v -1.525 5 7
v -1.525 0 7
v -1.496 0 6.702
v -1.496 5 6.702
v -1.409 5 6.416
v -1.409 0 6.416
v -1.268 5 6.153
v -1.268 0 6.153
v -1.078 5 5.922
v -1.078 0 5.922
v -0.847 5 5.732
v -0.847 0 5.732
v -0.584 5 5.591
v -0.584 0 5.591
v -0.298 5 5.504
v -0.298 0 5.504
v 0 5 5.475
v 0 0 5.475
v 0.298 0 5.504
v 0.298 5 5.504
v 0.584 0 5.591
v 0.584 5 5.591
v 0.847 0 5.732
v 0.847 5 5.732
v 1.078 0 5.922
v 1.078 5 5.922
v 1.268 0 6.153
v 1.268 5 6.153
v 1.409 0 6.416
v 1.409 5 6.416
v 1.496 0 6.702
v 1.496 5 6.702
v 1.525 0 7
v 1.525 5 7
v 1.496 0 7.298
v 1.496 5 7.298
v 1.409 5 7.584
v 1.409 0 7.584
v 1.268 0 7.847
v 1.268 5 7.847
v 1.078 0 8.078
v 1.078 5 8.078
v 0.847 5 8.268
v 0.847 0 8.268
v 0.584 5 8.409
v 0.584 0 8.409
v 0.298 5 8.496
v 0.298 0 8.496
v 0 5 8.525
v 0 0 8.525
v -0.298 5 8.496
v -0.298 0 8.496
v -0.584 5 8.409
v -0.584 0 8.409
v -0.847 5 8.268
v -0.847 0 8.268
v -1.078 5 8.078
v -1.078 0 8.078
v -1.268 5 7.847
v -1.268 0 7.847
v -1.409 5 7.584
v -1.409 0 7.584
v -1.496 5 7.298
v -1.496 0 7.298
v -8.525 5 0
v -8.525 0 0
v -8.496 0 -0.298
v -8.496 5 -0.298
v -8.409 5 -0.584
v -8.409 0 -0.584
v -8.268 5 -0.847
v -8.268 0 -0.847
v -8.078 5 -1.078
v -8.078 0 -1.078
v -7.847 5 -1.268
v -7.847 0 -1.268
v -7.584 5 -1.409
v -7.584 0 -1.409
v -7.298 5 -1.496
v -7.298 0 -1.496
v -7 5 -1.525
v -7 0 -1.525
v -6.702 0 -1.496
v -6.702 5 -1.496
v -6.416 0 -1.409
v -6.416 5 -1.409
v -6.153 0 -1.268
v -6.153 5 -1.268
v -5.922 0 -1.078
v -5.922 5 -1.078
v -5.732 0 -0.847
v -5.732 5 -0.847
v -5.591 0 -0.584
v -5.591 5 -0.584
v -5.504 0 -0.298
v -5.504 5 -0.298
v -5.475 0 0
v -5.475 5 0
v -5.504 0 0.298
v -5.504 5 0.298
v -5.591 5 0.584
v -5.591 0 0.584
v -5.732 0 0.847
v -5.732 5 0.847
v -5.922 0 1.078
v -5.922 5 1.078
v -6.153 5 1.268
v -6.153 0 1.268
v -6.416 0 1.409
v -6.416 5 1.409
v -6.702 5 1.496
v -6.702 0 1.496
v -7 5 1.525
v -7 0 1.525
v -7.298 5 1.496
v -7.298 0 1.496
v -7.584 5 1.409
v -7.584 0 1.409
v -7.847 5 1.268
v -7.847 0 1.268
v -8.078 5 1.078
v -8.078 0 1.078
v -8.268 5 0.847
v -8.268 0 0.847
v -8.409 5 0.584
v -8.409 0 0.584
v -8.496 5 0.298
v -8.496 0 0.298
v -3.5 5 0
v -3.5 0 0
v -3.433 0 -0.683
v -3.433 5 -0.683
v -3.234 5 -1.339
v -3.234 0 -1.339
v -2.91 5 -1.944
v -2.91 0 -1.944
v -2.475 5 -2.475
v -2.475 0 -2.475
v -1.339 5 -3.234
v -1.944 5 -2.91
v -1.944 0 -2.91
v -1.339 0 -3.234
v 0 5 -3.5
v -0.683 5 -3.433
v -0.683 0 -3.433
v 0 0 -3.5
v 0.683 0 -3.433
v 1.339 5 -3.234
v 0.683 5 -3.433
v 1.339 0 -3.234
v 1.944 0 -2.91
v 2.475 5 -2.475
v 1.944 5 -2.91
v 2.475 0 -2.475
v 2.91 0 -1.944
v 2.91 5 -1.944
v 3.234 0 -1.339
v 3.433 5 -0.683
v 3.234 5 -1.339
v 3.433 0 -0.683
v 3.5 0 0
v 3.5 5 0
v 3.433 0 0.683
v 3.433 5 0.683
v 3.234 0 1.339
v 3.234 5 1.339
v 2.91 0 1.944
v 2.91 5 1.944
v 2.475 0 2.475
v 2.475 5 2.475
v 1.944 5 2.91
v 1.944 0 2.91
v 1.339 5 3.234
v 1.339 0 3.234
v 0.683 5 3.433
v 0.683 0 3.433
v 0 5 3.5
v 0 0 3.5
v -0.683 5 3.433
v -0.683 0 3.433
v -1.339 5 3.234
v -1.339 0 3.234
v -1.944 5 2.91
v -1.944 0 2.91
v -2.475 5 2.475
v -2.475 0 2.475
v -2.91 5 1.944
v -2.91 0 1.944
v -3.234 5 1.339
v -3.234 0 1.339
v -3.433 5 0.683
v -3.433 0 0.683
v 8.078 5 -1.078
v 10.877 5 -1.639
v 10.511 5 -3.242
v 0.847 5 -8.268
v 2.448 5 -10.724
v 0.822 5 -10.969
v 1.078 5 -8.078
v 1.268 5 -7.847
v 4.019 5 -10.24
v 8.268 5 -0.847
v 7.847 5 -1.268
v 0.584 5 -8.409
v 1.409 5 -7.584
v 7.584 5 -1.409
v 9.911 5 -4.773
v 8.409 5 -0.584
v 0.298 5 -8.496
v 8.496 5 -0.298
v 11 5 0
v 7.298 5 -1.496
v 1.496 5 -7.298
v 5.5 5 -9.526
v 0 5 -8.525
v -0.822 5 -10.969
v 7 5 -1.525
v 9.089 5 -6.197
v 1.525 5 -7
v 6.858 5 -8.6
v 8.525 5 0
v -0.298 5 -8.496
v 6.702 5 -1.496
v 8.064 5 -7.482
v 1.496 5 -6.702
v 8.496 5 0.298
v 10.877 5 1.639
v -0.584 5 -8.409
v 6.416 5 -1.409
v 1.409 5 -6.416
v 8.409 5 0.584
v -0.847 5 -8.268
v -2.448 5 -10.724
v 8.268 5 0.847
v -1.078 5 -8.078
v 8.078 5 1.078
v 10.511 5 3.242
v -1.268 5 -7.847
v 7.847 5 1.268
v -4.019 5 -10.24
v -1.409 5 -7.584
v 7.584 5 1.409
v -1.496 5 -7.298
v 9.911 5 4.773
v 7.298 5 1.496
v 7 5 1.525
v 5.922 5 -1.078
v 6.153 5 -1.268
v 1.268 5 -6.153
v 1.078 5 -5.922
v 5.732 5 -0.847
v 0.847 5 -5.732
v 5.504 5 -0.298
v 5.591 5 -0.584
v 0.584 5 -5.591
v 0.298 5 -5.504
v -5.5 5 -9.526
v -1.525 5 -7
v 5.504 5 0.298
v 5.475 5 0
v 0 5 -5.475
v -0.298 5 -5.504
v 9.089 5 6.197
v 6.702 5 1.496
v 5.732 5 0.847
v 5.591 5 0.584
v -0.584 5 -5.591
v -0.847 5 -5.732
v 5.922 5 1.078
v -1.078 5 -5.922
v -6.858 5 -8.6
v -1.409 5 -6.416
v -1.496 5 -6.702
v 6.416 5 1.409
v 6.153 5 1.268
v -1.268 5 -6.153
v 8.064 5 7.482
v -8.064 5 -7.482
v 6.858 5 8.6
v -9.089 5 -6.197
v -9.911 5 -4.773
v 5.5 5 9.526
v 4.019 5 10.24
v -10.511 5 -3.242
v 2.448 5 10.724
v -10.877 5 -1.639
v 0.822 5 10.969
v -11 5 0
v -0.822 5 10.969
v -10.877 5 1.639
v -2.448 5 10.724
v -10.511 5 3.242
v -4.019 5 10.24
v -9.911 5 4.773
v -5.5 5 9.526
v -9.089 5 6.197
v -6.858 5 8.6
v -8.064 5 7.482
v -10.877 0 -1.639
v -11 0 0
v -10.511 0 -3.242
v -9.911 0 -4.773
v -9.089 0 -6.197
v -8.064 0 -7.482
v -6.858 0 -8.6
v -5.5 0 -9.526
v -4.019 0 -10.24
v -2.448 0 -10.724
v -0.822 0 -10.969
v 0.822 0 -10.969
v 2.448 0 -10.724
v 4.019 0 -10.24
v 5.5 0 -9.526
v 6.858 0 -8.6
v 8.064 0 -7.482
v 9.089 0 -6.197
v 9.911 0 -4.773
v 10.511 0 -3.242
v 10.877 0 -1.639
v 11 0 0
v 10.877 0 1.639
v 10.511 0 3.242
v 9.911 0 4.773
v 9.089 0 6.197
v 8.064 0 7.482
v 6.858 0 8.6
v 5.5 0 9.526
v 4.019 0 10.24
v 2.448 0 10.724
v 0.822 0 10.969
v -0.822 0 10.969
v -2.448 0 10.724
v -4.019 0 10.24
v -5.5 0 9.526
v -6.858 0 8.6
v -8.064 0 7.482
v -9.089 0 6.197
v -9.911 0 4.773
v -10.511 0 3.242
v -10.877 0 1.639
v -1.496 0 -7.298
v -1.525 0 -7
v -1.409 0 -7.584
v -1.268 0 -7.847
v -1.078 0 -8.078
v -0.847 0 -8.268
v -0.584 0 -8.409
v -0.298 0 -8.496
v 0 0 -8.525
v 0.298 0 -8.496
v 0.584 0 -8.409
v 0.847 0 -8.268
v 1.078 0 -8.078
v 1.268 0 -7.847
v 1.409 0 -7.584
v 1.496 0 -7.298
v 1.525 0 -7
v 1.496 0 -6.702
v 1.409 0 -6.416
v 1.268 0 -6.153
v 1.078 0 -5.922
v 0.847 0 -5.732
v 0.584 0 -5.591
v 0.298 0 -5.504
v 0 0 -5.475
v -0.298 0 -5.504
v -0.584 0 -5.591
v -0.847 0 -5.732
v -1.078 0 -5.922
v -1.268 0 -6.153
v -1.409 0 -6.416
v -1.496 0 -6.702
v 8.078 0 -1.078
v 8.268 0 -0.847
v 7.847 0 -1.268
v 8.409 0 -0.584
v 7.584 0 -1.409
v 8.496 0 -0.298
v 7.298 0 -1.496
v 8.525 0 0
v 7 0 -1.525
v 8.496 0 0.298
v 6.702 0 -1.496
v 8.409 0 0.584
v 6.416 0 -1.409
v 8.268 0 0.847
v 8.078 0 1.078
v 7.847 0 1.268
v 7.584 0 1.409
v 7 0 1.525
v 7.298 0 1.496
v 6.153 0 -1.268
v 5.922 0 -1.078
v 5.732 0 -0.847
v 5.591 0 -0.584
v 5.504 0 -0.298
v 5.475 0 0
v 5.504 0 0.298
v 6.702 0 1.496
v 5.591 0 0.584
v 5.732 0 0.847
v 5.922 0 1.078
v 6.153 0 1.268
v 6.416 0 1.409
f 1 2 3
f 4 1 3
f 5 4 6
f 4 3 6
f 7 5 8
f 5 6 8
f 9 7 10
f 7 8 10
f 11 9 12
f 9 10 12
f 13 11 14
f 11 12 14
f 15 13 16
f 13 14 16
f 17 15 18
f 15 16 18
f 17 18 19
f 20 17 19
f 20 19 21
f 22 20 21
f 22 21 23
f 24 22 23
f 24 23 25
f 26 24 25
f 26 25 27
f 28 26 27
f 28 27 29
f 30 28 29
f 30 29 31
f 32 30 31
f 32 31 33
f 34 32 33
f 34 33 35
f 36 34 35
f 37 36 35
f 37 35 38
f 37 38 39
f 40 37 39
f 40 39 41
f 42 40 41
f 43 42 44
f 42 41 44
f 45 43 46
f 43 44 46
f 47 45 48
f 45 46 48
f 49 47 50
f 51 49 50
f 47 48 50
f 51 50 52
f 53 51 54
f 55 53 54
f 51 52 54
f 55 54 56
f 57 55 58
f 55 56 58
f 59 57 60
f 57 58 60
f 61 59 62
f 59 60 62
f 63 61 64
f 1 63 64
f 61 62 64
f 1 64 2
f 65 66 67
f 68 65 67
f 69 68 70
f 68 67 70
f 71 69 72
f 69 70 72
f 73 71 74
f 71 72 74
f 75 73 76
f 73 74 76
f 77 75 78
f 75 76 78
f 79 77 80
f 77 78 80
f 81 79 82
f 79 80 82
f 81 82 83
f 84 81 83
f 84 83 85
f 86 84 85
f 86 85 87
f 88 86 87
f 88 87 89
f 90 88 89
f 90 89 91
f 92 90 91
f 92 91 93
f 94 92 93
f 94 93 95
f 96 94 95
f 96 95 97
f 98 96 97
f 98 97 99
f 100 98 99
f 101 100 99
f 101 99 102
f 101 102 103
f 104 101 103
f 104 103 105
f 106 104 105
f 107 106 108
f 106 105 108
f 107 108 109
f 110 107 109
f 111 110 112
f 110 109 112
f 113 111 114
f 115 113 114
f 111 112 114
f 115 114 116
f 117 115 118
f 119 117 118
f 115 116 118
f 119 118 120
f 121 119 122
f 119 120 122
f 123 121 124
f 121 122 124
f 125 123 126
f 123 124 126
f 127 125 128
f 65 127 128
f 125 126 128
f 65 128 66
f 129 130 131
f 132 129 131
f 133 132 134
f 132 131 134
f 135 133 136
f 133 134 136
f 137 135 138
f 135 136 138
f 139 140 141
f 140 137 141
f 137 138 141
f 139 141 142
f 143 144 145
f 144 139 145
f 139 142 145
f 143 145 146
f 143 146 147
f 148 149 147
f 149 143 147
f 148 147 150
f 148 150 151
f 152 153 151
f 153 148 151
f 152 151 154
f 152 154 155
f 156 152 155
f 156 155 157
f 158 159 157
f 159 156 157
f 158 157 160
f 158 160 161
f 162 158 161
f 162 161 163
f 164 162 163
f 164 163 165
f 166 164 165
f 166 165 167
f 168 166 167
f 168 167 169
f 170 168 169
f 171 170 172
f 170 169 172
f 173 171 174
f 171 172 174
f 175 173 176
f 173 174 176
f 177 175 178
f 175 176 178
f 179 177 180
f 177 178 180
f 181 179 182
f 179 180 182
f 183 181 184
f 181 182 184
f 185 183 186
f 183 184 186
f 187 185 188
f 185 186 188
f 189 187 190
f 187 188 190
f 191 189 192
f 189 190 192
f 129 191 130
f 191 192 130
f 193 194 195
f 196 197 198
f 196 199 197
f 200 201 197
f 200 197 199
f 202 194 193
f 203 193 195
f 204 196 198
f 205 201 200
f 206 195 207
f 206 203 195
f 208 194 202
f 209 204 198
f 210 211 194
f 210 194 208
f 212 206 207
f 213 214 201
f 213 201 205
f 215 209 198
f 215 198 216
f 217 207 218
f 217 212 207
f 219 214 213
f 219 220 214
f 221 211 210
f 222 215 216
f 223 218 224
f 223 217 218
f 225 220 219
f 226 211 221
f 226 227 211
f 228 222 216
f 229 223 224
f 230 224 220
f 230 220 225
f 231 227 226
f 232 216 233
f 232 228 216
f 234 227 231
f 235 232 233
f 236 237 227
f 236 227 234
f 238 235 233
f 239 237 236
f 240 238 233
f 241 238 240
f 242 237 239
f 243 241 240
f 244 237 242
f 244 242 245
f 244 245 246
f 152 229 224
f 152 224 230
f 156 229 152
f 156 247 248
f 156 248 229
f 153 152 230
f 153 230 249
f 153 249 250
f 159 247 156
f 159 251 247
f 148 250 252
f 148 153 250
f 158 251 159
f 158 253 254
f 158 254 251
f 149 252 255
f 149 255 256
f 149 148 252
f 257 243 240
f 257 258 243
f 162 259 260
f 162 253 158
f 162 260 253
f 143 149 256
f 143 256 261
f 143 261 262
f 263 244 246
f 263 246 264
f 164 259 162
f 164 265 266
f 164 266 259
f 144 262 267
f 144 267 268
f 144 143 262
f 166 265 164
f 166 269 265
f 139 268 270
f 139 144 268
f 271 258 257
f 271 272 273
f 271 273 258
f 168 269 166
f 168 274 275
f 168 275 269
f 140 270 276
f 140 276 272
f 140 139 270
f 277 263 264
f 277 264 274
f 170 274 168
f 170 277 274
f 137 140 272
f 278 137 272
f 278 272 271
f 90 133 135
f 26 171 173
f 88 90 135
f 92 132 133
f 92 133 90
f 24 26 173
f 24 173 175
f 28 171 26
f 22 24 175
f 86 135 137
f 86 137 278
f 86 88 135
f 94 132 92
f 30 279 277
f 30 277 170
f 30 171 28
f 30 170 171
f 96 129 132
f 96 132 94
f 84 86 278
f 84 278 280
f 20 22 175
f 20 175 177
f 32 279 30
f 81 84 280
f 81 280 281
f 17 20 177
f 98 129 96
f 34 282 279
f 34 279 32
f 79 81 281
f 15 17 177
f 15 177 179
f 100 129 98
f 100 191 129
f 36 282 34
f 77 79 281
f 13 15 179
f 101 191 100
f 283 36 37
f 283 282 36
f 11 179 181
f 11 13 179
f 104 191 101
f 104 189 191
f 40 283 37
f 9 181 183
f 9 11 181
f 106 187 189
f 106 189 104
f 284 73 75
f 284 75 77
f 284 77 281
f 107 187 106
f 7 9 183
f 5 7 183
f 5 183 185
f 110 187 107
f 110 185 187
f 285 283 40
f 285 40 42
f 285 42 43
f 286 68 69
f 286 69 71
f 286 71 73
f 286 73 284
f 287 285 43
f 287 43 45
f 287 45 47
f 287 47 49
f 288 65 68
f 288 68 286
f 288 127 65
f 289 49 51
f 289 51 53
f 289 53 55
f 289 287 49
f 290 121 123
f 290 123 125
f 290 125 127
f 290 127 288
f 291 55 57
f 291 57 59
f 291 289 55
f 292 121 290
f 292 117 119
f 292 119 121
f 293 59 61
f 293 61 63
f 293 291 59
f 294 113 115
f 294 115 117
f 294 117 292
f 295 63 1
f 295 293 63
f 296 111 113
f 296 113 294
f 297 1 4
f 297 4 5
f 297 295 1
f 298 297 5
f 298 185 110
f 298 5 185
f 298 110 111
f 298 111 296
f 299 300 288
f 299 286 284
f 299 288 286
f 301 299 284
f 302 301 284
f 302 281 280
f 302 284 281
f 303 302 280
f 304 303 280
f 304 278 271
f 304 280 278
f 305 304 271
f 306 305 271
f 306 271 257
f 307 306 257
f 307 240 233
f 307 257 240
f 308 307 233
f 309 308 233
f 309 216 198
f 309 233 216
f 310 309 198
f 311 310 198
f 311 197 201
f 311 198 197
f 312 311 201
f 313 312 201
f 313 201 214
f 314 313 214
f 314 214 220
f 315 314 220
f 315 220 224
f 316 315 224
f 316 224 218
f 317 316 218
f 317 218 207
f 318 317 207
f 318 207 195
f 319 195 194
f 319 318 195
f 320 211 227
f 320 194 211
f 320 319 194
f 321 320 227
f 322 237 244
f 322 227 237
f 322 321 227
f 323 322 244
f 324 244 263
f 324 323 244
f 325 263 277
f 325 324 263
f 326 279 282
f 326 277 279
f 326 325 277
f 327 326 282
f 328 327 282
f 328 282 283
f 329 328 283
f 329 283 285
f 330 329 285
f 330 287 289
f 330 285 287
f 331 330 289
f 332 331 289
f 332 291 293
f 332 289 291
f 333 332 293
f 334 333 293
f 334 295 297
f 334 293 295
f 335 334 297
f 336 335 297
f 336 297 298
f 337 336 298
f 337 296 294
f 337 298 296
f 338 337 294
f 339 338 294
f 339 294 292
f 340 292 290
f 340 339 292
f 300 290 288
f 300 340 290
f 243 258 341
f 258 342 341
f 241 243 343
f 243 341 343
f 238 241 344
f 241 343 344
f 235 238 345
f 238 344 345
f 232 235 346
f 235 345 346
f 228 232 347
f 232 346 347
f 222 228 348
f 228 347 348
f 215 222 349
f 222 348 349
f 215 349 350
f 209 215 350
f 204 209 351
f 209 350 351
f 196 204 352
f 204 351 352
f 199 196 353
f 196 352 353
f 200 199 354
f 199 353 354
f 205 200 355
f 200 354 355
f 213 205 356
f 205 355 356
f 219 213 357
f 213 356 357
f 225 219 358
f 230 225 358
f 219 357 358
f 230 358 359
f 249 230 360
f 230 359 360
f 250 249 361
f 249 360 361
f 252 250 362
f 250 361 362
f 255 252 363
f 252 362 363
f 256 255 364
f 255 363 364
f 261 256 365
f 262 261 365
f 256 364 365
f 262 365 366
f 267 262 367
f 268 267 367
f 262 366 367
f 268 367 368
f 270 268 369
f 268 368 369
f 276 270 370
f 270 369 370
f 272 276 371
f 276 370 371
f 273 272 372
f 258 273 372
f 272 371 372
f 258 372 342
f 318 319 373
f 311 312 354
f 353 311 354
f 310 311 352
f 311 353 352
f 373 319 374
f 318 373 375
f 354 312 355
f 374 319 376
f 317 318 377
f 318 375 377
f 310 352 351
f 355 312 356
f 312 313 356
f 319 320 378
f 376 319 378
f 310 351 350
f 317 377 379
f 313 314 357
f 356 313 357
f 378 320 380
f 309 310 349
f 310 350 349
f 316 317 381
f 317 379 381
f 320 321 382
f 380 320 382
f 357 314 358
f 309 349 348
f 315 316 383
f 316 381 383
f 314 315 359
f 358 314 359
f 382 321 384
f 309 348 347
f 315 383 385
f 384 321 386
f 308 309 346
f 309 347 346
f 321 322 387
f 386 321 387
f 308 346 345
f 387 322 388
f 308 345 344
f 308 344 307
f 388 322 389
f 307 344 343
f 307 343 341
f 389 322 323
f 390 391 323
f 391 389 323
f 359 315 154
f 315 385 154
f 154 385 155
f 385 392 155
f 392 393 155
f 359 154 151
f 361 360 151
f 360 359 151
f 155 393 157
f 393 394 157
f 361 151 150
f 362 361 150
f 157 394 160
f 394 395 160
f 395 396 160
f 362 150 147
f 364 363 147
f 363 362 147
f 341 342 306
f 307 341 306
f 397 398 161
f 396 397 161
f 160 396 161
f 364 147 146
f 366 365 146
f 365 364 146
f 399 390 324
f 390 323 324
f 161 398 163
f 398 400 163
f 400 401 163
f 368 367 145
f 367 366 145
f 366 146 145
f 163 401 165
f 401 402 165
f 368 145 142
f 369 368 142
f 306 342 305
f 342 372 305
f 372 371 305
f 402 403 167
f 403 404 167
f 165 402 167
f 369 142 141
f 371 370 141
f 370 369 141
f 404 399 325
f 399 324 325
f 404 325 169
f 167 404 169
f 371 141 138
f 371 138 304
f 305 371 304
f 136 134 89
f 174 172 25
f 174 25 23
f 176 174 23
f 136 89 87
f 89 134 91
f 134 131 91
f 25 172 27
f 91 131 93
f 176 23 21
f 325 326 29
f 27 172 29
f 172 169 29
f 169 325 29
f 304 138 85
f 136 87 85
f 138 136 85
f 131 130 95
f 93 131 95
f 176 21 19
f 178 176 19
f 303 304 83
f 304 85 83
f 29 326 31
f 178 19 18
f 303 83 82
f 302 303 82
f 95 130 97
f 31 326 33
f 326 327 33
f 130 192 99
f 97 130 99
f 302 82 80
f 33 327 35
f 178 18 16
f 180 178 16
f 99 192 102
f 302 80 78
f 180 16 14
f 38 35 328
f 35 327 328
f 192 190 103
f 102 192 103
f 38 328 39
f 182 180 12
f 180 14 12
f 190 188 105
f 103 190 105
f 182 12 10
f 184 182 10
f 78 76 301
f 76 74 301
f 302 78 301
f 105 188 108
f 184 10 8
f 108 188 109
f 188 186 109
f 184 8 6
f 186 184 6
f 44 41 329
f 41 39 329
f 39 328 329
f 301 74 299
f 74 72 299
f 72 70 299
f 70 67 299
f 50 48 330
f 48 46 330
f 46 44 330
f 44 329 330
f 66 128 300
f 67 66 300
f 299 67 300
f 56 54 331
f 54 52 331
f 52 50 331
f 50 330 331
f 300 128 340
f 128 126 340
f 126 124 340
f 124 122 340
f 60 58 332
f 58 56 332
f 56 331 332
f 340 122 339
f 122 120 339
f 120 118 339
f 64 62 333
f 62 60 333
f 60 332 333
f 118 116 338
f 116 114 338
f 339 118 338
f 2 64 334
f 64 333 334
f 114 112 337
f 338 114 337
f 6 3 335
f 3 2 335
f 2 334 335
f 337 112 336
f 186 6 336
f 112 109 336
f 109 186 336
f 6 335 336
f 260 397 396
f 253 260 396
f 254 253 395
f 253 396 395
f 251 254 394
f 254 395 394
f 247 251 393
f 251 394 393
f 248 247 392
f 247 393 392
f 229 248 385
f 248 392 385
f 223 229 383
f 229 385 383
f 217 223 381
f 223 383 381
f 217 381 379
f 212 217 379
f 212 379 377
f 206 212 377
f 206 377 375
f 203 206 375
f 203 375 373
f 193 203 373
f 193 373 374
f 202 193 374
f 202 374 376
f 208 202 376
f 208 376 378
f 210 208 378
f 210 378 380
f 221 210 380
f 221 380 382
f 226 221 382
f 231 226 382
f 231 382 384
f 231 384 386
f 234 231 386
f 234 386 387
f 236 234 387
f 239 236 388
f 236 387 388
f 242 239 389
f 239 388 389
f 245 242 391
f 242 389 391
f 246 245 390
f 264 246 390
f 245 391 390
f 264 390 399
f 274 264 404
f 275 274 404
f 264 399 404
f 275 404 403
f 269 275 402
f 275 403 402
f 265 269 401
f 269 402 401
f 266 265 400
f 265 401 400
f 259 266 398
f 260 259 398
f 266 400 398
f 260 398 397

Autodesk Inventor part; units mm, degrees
ref_plane "YZ Plane" through (0, 0, 0) normal (1, 0, 0) x (0, 1, 0)
ref_plane "XZ Plane" through (0, 0, 0) normal (0, 1, 0) x (-1, 0, 0)
ref_plane "XY Plane" through (0, 0, 0) normal (0, 0, 1) x (1, 0, 0)
sketch "草图1" plane through (0, 0, 0) normal (0, 1, 0) x (-1, 0, 0)
  circle A0 centre (0, 0) radius 11
  circle A1 centre (0, 0) radius 7
  circle A2 centre (0, 0) radius 3.5
  circle A3 centre (7, 0) radius 1.525
  circle A4 centre (0, 7) radius 1.525
  line L0 (0, 0) -> (2.2993, 0)
  line L1 (0, 0) -> (0, -1.9489)
  circle A5 centre (0, -7) radius 1.525
  circle A6 centre (-7, 0) radius 1.525
  dimension "d0" = 22
  dimension "d1" = 14
  dimension "d2" = 7
  dimension "d3" = 3.05
  dimension "d4" = 3.05
extrude "拉伸1" add sketch "草图1" along normal blind 5 contours A0 | A3 A1 A5 A6 A4
properties part number "leg5"
